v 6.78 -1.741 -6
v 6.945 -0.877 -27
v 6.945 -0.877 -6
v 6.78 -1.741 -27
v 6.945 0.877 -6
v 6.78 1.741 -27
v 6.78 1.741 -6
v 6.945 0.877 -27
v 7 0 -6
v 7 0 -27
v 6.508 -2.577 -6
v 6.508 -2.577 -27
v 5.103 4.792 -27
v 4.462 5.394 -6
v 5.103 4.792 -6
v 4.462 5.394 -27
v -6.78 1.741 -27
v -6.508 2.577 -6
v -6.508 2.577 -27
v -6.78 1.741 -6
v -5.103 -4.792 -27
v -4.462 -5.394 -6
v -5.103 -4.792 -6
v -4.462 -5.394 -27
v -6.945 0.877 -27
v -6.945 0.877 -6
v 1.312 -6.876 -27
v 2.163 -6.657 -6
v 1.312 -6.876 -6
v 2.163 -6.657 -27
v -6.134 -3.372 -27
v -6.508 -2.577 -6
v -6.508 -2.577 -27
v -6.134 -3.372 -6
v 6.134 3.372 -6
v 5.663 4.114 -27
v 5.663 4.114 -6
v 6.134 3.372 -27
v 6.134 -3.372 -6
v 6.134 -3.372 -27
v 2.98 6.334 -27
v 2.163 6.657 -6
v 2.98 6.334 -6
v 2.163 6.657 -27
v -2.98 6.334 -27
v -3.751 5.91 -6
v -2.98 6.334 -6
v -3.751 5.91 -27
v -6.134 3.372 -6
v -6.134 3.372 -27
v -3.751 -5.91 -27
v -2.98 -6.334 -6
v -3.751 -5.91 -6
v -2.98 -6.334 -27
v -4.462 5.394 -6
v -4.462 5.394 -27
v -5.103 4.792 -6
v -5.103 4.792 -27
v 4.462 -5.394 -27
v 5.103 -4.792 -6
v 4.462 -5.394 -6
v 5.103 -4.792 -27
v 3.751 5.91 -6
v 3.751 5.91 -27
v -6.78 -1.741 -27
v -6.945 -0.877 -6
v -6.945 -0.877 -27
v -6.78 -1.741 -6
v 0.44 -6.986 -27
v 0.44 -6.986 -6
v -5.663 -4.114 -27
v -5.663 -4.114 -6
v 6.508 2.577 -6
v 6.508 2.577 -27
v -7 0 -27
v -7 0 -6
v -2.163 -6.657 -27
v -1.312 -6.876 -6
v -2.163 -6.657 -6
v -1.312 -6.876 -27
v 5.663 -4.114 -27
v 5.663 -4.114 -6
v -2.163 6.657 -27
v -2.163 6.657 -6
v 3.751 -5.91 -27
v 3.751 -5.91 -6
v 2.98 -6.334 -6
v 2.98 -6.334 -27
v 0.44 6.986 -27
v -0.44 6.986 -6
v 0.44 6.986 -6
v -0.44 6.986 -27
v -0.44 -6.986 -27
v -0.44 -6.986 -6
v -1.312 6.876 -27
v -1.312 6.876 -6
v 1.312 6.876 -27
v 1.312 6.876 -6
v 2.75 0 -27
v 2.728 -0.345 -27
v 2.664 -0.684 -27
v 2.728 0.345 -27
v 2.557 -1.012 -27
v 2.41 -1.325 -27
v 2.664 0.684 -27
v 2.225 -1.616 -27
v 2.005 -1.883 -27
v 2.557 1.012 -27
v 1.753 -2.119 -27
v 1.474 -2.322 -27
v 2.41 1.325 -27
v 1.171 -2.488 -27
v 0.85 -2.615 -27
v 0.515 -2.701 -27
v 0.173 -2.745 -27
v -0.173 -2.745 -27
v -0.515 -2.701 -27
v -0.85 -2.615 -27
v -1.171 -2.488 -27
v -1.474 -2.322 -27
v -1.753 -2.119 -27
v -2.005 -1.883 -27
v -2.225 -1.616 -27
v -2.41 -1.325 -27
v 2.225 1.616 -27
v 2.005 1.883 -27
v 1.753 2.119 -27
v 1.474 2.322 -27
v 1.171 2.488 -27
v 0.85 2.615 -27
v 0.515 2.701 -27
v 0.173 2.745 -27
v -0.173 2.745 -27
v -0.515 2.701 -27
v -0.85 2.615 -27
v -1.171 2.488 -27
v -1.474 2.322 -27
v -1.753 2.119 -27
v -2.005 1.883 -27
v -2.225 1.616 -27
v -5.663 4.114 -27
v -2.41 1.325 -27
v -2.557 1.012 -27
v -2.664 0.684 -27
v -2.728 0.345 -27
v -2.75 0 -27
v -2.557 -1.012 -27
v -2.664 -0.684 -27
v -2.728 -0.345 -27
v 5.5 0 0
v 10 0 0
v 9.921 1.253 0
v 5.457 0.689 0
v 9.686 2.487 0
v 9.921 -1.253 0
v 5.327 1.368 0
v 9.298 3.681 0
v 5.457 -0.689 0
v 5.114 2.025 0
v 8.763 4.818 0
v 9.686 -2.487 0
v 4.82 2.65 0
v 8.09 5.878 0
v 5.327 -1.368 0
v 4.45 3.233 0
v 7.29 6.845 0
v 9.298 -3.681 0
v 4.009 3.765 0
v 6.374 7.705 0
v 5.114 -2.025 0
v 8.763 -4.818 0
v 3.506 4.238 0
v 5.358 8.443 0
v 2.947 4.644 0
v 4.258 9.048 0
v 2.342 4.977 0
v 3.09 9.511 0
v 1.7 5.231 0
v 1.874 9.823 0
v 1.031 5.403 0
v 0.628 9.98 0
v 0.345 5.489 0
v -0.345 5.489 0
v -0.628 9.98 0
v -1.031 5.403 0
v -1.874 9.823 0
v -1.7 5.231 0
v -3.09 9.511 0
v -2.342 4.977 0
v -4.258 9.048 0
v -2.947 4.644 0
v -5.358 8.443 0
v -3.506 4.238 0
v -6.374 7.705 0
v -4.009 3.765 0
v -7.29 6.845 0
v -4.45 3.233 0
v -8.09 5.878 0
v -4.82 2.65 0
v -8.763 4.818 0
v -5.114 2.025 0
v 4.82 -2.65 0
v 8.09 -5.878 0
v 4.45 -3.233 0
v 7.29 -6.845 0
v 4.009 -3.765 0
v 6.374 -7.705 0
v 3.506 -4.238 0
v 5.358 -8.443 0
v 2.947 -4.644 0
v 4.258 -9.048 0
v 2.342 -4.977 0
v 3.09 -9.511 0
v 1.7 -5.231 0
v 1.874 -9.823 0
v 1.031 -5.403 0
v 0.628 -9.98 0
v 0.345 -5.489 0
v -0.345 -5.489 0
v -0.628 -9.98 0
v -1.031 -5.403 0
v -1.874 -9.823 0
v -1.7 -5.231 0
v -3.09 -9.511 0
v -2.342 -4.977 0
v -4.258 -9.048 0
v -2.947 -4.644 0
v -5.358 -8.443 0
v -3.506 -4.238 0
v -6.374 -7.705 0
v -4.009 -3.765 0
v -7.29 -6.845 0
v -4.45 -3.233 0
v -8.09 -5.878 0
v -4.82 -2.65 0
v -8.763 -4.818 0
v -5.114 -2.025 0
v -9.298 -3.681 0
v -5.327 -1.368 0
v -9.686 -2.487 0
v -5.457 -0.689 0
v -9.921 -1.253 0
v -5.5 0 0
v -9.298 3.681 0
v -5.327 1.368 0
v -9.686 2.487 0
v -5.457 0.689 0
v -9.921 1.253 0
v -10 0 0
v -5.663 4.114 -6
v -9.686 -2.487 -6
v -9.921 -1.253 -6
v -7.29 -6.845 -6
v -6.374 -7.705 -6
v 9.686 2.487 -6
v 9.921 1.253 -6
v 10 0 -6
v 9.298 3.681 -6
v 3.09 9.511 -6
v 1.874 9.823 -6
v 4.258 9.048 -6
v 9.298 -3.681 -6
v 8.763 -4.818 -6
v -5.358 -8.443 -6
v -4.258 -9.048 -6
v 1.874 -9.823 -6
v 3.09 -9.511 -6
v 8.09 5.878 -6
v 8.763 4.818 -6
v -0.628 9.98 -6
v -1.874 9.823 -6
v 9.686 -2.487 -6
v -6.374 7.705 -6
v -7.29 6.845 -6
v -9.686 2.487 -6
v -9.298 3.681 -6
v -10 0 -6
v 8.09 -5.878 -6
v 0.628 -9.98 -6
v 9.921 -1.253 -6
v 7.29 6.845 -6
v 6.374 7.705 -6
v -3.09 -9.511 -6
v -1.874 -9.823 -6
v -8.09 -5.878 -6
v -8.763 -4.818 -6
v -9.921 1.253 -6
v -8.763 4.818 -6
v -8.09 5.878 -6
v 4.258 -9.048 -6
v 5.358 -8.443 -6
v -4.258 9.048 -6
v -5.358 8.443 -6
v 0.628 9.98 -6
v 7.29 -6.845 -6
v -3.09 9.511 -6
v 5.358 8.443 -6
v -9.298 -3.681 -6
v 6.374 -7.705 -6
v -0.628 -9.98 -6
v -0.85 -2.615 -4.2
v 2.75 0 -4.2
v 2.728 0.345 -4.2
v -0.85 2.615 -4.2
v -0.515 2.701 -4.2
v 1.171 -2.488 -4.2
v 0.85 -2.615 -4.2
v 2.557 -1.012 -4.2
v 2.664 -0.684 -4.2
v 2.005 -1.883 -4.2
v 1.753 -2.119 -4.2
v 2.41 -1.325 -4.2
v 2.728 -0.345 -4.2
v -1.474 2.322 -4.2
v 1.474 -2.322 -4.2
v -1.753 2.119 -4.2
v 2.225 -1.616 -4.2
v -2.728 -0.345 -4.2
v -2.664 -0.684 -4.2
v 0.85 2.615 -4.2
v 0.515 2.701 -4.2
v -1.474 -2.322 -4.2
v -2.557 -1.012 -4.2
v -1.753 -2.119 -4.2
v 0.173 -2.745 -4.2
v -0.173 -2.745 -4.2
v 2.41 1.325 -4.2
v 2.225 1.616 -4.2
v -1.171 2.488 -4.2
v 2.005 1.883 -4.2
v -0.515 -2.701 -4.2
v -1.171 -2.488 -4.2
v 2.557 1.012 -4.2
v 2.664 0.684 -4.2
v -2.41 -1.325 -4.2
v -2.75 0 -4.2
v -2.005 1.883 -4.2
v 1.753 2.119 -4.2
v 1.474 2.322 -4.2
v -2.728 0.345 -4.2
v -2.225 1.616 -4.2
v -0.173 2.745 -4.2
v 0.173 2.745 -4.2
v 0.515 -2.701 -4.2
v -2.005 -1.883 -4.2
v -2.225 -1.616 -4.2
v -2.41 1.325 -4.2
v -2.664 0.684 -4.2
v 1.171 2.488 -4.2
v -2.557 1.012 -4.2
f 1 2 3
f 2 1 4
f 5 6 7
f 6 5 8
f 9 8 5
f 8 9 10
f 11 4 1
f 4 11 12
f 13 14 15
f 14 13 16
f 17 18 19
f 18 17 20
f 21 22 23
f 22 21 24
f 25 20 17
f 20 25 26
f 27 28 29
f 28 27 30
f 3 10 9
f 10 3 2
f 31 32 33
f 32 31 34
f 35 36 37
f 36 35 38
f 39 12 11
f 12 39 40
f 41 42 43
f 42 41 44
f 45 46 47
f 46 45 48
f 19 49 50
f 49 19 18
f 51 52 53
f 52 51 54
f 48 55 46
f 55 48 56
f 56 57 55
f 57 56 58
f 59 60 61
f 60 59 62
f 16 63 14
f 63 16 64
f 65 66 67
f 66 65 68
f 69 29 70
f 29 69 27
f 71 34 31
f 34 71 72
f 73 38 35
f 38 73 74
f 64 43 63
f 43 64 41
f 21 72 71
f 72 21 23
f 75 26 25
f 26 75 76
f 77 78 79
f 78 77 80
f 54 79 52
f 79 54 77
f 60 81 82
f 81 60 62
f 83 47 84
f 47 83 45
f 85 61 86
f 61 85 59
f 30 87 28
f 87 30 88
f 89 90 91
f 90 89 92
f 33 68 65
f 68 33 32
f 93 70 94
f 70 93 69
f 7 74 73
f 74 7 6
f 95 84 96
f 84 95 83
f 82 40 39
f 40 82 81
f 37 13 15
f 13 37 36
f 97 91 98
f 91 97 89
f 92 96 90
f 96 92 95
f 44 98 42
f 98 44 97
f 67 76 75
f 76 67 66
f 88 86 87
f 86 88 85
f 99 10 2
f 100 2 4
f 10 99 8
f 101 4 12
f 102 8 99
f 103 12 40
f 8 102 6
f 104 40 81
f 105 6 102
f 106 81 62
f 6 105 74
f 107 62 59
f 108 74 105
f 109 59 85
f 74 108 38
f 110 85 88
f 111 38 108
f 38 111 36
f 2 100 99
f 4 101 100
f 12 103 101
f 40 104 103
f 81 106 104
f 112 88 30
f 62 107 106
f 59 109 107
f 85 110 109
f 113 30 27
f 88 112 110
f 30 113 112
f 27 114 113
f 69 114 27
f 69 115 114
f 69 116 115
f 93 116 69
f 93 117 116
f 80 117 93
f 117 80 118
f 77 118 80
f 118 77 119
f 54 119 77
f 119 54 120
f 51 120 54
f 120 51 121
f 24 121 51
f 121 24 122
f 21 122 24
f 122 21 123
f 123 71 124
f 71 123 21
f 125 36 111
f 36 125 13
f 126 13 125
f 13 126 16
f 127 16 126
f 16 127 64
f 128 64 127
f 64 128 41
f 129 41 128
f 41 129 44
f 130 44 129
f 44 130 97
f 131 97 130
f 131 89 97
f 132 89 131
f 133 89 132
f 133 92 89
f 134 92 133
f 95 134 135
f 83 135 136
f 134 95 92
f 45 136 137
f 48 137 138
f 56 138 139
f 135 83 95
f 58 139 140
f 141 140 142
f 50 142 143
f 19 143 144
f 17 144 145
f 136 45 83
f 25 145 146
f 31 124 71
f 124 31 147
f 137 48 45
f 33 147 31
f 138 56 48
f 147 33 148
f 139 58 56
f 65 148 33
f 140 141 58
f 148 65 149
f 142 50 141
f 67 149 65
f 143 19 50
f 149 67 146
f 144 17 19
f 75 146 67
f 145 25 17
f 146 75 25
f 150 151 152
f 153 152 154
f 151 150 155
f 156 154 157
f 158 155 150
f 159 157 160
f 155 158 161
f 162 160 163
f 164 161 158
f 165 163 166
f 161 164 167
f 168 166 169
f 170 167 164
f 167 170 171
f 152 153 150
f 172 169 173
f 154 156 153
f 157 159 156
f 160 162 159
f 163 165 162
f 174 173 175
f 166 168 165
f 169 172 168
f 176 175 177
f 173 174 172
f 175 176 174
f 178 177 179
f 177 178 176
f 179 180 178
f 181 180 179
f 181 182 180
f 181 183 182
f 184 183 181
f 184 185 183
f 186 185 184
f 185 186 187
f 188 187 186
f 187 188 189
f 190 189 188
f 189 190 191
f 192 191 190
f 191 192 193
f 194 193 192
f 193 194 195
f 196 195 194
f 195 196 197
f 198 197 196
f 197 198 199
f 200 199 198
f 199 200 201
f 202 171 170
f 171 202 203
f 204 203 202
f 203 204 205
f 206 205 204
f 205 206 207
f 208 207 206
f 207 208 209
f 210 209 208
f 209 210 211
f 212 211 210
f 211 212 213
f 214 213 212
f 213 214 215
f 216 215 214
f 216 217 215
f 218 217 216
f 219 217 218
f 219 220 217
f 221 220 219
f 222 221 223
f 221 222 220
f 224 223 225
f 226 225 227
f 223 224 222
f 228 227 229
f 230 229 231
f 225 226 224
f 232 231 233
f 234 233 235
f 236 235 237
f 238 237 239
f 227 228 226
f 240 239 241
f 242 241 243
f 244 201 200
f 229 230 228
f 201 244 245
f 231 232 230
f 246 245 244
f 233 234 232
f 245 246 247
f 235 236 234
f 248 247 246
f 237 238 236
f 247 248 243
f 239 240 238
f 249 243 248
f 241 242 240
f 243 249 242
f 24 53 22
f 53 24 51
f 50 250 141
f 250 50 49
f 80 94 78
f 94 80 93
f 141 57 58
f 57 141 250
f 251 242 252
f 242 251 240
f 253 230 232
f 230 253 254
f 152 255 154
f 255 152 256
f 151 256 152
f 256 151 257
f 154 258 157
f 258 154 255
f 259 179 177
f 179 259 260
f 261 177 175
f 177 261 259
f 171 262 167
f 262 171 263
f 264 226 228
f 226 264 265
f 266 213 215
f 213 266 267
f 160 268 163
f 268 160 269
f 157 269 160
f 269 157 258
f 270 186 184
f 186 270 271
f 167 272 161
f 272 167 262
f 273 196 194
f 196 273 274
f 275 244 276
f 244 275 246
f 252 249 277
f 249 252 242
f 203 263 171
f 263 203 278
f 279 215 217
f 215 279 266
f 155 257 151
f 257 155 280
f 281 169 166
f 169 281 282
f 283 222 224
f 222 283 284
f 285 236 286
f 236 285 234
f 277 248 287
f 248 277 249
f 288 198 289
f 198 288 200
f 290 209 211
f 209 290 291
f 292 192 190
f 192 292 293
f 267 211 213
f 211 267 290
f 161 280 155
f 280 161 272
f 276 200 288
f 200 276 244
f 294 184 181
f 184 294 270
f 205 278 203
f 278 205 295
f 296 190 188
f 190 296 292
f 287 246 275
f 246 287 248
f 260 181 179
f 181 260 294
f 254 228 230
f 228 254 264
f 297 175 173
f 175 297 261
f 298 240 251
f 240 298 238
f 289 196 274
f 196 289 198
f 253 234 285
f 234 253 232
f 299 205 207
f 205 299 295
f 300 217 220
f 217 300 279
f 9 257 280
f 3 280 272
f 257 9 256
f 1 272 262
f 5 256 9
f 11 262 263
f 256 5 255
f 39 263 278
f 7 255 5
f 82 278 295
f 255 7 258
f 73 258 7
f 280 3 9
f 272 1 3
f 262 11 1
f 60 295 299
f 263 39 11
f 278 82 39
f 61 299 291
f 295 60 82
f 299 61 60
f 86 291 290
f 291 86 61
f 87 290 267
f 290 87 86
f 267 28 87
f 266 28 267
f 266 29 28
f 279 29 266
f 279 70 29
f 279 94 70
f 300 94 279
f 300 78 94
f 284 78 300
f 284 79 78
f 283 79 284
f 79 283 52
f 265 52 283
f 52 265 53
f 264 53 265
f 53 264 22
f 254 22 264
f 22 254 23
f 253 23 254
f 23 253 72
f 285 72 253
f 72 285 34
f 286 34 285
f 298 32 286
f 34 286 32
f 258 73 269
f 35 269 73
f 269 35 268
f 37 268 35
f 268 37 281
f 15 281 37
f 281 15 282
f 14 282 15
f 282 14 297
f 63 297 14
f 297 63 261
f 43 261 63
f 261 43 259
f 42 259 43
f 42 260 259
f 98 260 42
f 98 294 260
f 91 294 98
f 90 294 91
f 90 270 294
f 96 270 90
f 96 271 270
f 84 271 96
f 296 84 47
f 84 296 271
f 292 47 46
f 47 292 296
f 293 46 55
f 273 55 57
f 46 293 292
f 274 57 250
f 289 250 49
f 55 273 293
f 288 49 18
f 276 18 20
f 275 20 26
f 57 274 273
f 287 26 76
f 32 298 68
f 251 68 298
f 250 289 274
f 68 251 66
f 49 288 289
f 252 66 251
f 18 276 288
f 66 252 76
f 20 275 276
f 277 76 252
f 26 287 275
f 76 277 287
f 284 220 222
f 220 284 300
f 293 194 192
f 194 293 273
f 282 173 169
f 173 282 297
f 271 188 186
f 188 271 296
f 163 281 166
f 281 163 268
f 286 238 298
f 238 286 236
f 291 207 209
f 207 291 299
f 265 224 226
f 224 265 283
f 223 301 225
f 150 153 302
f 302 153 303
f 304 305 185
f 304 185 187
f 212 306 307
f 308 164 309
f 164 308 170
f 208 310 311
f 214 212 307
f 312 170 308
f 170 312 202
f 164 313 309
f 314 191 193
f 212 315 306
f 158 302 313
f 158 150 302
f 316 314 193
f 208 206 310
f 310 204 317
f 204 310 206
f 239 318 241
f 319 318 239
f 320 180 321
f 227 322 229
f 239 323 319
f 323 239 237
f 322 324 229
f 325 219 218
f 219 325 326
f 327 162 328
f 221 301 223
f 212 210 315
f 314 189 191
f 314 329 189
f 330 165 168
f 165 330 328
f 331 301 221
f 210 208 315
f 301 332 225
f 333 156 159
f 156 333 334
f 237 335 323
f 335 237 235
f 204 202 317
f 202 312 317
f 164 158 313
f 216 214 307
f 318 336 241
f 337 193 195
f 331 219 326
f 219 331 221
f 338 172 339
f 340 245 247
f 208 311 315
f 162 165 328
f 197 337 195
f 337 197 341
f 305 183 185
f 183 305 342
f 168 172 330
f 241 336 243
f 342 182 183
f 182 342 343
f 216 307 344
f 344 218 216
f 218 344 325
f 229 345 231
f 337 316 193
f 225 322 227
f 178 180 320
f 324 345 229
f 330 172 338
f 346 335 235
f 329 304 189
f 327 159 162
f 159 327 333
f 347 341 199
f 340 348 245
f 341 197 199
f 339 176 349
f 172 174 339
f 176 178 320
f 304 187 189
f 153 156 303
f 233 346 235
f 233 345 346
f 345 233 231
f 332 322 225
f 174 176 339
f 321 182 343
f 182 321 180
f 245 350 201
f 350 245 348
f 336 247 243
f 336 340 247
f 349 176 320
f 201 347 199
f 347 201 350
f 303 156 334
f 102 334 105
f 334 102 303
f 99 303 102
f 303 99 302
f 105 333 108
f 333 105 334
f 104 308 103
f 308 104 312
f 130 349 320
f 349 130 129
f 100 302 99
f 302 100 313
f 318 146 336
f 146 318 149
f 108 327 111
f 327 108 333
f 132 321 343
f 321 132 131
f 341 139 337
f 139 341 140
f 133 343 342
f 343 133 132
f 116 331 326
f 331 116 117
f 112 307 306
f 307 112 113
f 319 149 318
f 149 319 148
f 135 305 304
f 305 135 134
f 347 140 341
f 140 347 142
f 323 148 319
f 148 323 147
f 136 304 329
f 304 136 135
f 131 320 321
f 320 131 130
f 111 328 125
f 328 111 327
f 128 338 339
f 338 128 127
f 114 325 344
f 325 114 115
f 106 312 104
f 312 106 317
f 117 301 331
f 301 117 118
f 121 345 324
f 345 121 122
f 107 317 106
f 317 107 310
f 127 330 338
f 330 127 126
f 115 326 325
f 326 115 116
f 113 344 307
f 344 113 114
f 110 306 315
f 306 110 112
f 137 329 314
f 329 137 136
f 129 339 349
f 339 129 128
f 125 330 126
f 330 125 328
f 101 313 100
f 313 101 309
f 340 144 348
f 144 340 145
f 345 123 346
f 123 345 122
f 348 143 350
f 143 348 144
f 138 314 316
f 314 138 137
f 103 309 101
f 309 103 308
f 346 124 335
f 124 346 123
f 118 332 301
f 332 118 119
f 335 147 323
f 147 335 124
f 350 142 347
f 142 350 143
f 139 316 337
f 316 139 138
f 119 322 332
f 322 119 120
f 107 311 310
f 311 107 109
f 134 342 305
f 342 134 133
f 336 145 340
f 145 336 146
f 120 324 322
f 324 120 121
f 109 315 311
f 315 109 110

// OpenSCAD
$fn = 50;


difference() {
	union() {
		translate(v = [0, 0, -27.0000000000]) {
			cylinder(h = 27, r = 7.0000000000);
		}
		translate(v = [0, 0, -6.0000000000]) {
			cylinder(h = 6, r = 10.0000000000);
		}
	}
	union() {
		translate(v = [0, 0, 0]) {
			rotate(a = [0, 0, 0]) {
				difference() {
					union() {
						#translate(v = [0, 0, -27.0000000000]) {
							cylinder(h = 27, r = 2.2500000000);
						}
						#translate(v = [0, 0, -4.2000000000]) {
							cylinder(h = 4.2000000000, r = 7.0000000000, r1 = 2.7500000000, r2 = 5.5000000000);
						}
						#translate(v = [0, 0, -27.0000000000]) {
							cylinder(h = 27, r = 2.7500000000);
						}
						#translate(v = [0, 0, -27.0000000000]) {
							cylinder(h = 27, r = 2.2500000000);
						}
					}
					union();
				}
			}
		}
	}
}
